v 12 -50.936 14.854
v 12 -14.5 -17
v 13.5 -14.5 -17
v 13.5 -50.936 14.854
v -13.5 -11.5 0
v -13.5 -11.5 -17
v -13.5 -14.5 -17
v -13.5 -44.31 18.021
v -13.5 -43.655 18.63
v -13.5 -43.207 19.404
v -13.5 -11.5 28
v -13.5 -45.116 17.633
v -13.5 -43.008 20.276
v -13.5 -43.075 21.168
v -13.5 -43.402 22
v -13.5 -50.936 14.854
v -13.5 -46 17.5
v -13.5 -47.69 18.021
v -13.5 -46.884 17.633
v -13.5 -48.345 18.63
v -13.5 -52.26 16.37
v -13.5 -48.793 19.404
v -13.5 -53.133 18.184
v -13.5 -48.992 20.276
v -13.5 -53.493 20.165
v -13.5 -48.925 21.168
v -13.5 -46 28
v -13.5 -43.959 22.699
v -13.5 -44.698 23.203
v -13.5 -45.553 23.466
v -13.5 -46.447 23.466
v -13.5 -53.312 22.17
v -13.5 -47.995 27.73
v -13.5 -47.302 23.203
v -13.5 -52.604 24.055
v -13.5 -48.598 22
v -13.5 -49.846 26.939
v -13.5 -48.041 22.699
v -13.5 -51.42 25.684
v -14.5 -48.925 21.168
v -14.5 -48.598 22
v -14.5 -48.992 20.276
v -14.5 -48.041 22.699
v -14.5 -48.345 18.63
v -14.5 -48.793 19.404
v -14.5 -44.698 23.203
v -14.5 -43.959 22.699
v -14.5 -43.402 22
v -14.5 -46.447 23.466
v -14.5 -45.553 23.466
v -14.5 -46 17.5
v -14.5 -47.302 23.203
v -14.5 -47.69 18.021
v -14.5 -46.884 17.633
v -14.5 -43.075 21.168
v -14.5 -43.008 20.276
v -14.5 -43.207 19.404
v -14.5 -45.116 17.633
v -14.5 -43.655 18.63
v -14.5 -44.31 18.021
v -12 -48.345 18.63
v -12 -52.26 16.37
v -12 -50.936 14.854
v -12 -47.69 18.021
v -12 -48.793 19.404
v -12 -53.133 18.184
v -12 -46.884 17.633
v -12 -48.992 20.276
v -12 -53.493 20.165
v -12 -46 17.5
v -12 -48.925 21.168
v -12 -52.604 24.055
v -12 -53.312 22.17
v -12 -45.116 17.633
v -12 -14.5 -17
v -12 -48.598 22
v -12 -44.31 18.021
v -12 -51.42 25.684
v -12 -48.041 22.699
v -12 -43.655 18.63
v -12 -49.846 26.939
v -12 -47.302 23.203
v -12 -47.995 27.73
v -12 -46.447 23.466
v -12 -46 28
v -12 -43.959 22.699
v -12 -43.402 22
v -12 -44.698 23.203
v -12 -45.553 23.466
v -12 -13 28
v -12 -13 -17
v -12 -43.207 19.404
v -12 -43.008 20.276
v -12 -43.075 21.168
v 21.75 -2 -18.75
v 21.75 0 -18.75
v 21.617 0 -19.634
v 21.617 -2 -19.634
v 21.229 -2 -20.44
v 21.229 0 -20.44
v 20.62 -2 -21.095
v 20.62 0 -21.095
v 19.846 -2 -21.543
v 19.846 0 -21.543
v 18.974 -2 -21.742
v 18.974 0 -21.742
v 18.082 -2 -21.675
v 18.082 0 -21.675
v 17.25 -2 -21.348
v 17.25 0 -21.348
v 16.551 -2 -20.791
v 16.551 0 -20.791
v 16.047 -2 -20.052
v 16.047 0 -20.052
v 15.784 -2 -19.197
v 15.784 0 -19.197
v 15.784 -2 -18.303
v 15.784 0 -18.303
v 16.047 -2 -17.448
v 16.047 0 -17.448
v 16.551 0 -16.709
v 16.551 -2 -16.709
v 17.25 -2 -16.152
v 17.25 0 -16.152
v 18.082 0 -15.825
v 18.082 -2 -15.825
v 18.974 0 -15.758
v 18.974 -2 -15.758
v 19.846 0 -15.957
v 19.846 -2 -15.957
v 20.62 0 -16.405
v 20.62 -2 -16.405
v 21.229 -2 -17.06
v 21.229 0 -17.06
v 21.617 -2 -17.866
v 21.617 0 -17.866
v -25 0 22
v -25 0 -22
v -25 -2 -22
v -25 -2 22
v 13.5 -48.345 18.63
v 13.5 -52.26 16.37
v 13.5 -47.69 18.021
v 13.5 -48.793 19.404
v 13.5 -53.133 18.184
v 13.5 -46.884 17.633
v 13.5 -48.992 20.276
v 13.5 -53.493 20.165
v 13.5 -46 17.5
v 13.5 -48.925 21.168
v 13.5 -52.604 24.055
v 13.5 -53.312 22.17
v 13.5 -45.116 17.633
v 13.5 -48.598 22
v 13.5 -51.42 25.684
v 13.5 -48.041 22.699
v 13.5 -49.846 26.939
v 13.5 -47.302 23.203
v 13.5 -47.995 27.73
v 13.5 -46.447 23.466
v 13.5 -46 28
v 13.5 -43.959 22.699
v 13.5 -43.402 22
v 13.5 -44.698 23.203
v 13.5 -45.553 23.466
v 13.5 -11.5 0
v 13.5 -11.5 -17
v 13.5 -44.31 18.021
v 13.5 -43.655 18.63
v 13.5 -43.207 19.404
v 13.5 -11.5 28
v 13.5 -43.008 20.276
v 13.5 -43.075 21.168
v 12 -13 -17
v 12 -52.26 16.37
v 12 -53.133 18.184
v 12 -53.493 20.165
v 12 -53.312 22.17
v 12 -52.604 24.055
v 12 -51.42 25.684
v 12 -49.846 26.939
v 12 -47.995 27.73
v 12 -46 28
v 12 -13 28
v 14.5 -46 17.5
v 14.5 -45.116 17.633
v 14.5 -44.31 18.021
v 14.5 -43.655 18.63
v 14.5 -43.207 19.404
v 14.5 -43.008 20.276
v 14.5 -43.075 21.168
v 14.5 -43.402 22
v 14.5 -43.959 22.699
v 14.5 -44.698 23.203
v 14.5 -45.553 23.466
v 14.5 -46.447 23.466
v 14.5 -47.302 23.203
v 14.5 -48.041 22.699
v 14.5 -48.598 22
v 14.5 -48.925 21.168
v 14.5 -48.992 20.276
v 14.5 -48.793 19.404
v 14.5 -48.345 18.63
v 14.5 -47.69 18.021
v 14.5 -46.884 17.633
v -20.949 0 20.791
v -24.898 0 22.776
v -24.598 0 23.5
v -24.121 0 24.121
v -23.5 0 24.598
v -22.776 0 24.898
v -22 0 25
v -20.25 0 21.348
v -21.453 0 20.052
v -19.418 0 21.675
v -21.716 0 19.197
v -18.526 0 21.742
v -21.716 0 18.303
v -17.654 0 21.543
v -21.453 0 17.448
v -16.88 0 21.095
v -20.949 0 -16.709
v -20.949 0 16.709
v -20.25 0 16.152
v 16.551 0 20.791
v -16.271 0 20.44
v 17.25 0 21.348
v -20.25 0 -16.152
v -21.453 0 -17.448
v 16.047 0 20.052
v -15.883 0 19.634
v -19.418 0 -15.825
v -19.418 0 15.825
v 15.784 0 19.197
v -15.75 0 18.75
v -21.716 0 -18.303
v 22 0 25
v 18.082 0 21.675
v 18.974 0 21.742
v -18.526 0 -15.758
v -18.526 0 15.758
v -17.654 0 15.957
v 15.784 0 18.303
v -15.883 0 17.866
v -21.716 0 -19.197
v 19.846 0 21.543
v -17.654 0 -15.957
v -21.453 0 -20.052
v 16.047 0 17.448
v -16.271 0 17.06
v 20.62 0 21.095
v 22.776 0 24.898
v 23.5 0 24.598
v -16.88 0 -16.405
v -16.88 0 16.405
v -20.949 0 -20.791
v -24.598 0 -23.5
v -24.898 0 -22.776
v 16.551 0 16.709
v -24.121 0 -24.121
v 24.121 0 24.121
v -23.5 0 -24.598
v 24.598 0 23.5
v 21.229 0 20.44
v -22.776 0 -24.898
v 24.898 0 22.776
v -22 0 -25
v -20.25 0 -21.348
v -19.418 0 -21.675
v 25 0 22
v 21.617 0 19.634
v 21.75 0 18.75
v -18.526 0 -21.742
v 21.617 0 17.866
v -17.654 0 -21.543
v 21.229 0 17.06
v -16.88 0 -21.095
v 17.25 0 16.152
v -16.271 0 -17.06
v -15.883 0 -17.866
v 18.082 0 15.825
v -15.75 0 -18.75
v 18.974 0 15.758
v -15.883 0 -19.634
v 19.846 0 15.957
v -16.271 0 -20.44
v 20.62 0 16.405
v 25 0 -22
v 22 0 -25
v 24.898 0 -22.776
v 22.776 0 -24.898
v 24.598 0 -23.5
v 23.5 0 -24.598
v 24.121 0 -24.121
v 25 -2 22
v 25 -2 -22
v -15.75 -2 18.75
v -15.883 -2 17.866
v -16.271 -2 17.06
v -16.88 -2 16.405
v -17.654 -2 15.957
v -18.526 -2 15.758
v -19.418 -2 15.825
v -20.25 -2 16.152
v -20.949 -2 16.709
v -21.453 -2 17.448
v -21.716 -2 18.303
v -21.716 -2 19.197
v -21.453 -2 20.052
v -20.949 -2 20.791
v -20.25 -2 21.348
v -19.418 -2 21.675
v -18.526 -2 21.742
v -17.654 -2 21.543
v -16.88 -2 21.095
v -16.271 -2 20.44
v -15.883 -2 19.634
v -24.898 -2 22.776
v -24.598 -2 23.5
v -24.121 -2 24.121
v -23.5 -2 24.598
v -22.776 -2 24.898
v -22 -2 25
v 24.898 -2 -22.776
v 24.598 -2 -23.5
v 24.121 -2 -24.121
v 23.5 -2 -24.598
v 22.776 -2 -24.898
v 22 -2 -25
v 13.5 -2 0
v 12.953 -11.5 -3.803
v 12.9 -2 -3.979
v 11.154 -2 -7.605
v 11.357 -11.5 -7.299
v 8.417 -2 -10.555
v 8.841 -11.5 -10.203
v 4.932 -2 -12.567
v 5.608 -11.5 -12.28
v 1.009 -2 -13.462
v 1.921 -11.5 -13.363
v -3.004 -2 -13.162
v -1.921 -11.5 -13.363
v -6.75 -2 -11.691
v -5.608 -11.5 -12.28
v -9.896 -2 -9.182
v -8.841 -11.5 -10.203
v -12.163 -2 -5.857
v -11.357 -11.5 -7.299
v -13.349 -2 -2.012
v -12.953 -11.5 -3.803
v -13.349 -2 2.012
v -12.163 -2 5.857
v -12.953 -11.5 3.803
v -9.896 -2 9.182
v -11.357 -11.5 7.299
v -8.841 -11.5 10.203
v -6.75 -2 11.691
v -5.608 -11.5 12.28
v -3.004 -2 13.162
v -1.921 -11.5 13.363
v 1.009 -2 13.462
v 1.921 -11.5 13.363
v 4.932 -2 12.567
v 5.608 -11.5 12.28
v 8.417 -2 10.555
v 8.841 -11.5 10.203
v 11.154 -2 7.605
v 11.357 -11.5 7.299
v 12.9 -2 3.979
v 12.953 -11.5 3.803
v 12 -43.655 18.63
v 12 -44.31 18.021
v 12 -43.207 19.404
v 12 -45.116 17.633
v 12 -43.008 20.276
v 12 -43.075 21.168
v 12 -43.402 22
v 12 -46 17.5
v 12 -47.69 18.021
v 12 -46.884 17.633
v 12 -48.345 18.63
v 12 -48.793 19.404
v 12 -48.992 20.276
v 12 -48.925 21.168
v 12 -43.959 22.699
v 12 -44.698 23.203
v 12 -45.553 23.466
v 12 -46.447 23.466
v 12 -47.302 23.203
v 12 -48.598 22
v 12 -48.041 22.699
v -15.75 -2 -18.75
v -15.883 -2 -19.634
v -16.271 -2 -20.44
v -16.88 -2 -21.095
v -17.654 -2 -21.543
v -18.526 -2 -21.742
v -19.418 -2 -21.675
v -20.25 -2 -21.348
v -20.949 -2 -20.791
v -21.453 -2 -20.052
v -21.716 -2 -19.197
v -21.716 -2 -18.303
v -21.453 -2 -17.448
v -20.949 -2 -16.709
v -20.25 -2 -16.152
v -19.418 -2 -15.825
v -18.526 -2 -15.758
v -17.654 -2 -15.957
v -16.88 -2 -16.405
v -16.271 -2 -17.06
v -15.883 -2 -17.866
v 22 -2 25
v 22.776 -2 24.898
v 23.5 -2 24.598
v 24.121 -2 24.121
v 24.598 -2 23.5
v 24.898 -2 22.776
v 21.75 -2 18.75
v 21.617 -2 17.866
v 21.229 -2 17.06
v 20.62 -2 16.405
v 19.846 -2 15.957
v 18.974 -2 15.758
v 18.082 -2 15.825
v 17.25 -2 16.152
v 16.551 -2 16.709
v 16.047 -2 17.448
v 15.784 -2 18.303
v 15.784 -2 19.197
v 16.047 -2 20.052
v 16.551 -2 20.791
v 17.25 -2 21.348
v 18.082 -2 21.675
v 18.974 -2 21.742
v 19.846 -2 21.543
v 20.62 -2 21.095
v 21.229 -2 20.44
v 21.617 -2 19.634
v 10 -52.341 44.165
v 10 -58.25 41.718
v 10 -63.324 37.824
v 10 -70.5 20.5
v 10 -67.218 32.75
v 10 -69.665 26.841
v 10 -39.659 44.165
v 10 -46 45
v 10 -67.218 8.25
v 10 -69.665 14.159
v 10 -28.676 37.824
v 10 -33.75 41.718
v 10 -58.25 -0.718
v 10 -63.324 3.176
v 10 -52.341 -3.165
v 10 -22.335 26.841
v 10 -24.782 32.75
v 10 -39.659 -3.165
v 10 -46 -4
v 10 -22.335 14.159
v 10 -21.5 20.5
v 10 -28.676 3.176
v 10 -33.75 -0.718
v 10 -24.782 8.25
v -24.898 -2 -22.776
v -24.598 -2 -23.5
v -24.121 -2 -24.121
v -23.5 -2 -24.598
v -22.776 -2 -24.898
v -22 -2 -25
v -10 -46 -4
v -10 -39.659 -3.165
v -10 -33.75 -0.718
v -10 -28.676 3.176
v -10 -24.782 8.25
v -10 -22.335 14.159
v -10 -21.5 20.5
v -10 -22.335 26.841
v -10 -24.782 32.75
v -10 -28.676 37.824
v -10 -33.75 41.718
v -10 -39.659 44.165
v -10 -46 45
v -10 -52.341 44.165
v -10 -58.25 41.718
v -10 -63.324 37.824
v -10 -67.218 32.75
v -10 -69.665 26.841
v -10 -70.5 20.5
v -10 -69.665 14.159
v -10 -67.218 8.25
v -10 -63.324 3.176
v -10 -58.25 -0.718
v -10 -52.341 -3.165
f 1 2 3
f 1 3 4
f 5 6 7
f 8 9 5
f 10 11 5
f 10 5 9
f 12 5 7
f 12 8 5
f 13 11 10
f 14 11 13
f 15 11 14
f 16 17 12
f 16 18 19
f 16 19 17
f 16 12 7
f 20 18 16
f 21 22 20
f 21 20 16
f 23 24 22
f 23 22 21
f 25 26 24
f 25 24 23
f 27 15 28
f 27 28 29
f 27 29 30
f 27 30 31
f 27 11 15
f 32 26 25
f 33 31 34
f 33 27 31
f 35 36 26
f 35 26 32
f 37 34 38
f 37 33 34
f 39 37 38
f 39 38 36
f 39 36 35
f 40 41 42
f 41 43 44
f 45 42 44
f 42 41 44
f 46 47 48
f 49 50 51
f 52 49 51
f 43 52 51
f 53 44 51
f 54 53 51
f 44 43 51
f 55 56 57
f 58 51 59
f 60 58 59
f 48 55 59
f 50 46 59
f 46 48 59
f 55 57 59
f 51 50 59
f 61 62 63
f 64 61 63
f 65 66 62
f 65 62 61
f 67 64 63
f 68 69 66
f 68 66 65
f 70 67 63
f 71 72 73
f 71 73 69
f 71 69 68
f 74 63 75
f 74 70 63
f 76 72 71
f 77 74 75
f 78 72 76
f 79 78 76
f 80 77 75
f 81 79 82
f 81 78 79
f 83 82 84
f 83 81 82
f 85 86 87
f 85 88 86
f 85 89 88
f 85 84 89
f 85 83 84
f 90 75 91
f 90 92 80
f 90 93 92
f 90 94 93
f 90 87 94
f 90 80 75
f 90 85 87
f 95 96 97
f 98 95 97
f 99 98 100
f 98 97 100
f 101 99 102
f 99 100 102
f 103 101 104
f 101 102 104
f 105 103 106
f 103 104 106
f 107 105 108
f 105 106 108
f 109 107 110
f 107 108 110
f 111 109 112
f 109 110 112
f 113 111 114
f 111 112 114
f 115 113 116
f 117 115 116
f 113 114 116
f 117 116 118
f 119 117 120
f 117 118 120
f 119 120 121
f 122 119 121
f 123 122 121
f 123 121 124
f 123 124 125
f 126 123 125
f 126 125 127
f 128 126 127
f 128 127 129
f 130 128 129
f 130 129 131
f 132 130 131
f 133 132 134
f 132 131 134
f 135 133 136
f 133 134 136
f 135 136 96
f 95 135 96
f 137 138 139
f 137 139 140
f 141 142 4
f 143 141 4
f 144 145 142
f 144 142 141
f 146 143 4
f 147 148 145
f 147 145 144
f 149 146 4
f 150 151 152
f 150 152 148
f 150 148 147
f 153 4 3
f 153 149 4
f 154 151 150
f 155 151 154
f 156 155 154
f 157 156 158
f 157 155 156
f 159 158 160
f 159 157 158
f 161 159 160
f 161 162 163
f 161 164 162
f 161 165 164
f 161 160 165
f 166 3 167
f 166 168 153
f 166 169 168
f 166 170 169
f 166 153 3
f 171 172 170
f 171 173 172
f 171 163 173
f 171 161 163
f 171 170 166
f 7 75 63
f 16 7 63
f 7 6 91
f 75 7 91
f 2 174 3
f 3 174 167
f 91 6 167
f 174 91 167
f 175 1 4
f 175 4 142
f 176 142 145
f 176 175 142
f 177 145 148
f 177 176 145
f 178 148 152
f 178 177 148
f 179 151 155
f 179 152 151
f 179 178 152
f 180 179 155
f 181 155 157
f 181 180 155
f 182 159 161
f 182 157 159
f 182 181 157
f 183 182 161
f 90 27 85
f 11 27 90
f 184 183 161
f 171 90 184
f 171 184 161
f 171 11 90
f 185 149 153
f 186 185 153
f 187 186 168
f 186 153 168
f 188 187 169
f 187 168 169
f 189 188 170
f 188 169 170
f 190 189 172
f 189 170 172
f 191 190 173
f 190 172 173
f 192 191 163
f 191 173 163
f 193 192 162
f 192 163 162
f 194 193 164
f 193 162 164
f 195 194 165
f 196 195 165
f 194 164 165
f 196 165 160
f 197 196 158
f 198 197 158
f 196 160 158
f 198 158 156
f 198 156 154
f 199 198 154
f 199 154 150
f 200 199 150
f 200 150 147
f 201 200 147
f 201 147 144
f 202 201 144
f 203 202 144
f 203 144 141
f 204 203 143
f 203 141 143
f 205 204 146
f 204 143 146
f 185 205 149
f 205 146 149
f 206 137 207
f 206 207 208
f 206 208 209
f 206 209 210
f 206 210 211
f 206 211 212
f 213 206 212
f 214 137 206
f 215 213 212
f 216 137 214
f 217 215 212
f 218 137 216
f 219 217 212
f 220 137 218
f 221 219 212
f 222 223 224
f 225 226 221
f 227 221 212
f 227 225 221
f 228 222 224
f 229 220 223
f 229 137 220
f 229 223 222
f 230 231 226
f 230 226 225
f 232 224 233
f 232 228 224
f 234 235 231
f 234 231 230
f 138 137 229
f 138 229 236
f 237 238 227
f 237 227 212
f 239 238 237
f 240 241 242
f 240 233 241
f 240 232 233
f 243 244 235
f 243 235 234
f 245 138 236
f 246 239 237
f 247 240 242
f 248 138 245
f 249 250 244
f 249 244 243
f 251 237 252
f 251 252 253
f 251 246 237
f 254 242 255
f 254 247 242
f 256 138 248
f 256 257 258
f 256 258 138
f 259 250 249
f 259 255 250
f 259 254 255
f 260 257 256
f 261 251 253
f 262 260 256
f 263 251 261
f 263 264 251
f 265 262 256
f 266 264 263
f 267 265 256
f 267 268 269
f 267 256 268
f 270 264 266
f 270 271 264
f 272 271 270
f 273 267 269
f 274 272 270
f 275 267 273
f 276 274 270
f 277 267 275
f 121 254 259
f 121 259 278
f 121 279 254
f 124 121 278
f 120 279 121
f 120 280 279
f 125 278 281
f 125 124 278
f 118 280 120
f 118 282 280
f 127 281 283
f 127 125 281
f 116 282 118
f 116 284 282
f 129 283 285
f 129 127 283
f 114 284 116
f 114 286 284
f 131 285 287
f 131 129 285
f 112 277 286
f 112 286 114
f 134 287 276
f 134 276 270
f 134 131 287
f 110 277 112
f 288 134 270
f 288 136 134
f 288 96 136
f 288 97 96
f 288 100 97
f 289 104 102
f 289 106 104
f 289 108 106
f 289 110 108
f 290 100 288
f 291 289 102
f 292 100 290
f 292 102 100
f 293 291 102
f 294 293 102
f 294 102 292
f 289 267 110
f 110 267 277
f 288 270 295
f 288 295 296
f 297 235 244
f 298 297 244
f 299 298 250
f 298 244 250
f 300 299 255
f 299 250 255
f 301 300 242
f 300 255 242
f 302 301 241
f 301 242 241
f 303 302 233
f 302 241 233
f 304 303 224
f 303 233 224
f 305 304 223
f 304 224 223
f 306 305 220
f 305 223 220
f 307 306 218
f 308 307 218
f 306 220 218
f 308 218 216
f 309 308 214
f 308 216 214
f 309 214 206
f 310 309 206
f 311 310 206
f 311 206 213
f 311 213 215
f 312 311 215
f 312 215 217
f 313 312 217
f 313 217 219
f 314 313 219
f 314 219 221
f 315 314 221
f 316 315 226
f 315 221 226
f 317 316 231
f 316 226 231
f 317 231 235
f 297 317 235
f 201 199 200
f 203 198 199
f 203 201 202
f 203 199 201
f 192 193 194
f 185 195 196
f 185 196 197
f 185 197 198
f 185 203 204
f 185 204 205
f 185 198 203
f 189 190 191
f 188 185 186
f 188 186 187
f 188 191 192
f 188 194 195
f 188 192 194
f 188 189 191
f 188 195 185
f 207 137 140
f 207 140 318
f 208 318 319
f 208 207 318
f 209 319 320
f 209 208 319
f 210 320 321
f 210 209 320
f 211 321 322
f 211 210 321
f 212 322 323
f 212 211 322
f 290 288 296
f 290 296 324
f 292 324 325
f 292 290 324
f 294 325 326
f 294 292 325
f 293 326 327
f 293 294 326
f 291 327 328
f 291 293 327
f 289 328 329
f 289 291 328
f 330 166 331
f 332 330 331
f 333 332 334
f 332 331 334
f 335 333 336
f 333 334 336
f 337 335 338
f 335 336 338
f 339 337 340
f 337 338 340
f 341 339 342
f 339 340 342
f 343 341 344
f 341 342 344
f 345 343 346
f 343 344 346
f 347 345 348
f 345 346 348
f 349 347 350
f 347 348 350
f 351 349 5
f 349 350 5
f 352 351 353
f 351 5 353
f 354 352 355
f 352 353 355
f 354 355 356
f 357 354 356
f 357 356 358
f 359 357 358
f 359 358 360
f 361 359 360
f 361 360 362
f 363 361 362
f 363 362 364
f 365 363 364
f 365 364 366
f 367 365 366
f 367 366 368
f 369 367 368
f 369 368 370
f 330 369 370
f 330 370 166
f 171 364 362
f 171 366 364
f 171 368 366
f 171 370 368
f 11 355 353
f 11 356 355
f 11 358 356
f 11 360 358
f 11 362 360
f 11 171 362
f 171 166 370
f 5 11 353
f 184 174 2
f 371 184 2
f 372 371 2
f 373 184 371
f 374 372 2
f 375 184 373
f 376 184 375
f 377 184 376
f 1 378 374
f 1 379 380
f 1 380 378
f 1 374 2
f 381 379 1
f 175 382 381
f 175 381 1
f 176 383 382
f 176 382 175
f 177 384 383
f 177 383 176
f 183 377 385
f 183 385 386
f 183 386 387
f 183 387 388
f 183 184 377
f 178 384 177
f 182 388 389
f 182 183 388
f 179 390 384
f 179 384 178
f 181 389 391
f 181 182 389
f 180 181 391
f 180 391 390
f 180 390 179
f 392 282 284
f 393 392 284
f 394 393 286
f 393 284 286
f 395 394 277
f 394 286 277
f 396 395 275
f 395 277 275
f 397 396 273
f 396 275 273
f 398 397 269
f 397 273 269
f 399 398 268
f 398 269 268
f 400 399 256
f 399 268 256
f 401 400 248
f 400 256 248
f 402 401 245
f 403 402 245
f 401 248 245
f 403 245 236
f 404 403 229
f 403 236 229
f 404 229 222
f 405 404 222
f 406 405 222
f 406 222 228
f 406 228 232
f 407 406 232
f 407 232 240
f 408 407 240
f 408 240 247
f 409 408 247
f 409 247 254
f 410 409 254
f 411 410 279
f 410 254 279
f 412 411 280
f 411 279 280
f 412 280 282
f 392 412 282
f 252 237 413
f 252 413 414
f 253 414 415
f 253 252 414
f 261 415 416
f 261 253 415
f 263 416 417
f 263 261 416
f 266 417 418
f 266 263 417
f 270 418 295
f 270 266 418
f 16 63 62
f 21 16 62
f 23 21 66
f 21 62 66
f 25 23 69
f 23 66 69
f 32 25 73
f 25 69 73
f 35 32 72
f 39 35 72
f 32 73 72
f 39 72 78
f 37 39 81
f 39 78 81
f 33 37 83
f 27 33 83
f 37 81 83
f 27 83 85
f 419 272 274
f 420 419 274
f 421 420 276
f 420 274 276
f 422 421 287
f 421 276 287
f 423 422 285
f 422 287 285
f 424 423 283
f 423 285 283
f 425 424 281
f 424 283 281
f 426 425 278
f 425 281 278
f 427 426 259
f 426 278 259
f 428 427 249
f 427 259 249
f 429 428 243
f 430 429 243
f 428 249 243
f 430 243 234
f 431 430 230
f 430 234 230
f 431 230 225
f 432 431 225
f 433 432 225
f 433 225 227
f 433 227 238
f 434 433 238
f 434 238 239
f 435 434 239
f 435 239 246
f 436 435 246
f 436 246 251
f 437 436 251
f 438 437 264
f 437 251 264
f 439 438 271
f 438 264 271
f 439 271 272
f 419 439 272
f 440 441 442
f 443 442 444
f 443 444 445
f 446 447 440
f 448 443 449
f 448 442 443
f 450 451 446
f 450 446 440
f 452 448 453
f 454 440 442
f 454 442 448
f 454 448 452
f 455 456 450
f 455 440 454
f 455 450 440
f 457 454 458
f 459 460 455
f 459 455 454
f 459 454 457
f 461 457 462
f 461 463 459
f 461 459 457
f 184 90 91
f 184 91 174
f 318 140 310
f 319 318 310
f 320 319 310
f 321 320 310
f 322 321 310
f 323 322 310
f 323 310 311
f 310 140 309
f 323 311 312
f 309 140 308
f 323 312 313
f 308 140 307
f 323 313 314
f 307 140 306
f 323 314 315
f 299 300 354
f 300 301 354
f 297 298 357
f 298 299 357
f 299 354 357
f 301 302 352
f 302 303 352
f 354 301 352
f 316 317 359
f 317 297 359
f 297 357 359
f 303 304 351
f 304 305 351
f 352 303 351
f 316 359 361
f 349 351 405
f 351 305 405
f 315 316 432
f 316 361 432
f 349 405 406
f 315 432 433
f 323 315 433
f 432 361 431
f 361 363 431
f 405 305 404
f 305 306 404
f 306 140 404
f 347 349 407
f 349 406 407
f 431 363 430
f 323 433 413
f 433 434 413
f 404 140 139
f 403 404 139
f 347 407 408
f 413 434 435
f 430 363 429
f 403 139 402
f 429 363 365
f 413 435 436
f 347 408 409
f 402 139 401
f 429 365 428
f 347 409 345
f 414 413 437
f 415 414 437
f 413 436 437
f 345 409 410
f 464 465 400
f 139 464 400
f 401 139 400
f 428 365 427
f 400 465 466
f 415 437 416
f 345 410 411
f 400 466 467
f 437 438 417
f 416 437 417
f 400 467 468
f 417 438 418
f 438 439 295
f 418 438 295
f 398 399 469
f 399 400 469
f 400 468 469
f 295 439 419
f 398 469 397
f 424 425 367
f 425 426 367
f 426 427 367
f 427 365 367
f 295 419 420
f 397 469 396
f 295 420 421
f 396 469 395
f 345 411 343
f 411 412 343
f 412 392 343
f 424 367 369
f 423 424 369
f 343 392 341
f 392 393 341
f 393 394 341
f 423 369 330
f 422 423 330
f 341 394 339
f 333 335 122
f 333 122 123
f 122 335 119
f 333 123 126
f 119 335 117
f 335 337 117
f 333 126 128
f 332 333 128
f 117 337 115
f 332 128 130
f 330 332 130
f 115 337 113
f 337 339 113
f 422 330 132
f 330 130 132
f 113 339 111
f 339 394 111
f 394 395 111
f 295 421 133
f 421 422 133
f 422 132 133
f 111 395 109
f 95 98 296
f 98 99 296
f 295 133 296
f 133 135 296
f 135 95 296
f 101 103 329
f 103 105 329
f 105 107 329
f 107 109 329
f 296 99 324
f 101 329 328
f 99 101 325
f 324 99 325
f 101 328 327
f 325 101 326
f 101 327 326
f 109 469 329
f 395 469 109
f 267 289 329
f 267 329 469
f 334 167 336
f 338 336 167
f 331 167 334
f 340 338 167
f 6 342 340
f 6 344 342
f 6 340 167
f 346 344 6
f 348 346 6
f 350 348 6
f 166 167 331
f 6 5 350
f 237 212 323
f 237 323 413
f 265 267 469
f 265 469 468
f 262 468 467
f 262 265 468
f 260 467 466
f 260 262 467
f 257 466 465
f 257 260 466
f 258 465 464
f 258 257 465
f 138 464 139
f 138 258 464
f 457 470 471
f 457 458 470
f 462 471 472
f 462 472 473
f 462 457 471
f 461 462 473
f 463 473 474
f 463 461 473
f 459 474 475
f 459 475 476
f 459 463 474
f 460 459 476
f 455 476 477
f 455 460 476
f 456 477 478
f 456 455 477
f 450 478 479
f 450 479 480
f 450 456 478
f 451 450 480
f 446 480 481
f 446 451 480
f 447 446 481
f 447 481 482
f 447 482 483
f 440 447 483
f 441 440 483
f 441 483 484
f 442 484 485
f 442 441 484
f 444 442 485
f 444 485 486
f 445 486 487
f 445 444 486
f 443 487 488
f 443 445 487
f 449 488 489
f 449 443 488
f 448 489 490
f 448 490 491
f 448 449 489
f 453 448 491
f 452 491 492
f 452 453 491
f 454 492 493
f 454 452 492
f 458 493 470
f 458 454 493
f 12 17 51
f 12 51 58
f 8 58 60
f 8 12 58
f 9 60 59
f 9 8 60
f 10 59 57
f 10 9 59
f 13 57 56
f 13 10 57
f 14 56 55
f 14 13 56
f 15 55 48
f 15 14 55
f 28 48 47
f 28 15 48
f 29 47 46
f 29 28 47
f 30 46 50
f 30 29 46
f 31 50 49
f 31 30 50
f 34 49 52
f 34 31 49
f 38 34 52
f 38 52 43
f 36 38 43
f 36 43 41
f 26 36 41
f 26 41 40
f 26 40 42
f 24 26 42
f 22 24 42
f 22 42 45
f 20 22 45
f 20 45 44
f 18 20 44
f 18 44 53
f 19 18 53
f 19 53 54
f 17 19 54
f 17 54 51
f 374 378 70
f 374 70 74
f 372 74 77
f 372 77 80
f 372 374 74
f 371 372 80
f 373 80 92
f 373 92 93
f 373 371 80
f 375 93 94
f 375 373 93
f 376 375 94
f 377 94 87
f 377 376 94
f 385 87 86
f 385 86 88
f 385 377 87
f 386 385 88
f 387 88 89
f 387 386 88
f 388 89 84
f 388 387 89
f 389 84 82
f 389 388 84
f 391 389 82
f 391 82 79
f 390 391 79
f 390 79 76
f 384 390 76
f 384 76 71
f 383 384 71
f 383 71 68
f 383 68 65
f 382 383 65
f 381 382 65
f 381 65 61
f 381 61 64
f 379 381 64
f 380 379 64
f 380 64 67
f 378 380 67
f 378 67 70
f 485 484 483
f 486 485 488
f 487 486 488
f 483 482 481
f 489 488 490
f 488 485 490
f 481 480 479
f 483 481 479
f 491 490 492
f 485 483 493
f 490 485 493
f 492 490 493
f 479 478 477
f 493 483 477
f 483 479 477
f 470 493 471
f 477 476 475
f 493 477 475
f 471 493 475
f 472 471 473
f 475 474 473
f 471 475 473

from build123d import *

# Parameters (mm, degrees)
SKETCH1_R                = 3
BOSS_EXTRUDE1_DEPTH      = 2
BOSS_EXTRUDE2_DEPTH      = 28
BOSS_EXTRUDE2_DEPTH_BACK = 17
SKETCH3_OUTSIDE_W        = 73.078
SKETCH3_OUTSIDE_H        = 73.578
CUT_EXTRUDE1_DEPTH       = 26
CUT_EXTRUDE1_DEPTH_BACK  = 26
SKETCH4_R                = 3
BOSS_EXTRUDE3_DEPTH      = 1
BOSS_EXTRUDE3_DEPTH_BACK = 28
SKETCH5_R                = 24.5
BOSS_EXTRUDE4_DEPTH      = 10
SKETCH6_R                = 13.5
BOSS_EXTRUDE5_DEPTH      = 9.5


with BuildPart() as part:
    # Sketch1 → Boss-Extrude1 (new body)
    with BuildSketch(Plane(origin=(0, 0, 0), x_dir=(1, 0, 0), z_dir=(0, 1, 0))):
        with BuildLine():
            Line((-22, -25), (22, -25))
            ThreePointArc((22, -25), (24.121320344, -24.121320344), (25, -22))
            Line((25, -22), (25, 22))
            ThreePointArc((25, 22), (24.121320344, 24.121320344), (22, 25))
            Line((22, 25), (-22, 25))
            ThreePointArc((-22, 25), (-24.121320344, 24.121320344), (-25, 22))
            Line((-25, 22), (-25, -22))
            ThreePointArc((-25, -22), (-24.121320344, -24.121320344), (-22, -25))
        make_face()
        with Locations((18.75, 18.75)):
            Circle(SKETCH1_R, mode=Mode.SUBTRACT)
        with Locations((18.75, -18.75)):
            Circle(SKETCH1_R, mode=Mode.SUBTRACT)
        with Locations((-18.75, -18.75)):
            Circle(SKETCH1_R, mode=Mode.SUBTRACT)
        with Locations((-18.75, 18.75)):
            Circle(SKETCH1_R, mode=Mode.SUBTRACT)
    extrude(amount=-BOSS_EXTRUDE1_DEPTH)



with BuildPart() as body_2:
    # Sketch2 → Boss-Extrude2 (new body, two sides)
    with BuildSketch(Plane.XY) as boss_extrude2_sk:
        Polygon((13.5, -53.5), (13.5, -11.5), (-13.5, -11.5), (-13.5, -53.5), (-12, -53.5), (-12, -13), (12, -13), (12, -53.5), align=None)
    extrude(amount=BOSS_EXTRUDE2_DEPTH)
    extrude(boss_extrude2_sk.sketch, amount=-BOSS_EXTRUDE2_DEPTH_BACK)

    # Sketch3 outside → Cut-Extrude1 (cut, two sides)
    with BuildSketch(Plane(origin=(0, 0, 0), x_dir=(0, 0, -1), z_dir=(1, 0, 0))) as cut_extrude1_sk:
        with Locations((-1.5, -26.75)):
            Rectangle(SKETCH3_OUTSIDE_W, SKETCH3_OUTSIDE_H)
        with BuildLine():
            Line((17, -11.5), (17, -14.5))
            Line((17, -14.5), (-14.853504945, -50.936303637))
            ThreePointArc((-14.853504945, -50.936303637), (-23.136407318, -53.021350045), (-28, -46))
            Line((-28, -46), (-28, -11.5))
            Line((-28, -11.5), (17, -11.5))
        make_face(mode=Mode.SUBTRACT)
    extrude(amount=CUT_EXTRUDE1_DEPTH, mode=Mode.SUBTRACT)
    extrude(cut_extrude1_sk.sketch, amount=-CUT_EXTRUDE1_DEPTH_BACK, mode=Mode.SUBTRACT)

    # Sketch4 → Boss-Extrude3 (add, two sides)
    with BuildSketch(Plane(origin=(13.5, 0, 0), x_dir=(0, 0, -1), z_dir=(1, 0, 0))) as boss_extrude3_sk:
        with Locations((-20.5, -46)):
            Circle(SKETCH4_R)
    extrude(amount=BOSS_EXTRUDE3_DEPTH)
    extrude(boss_extrude3_sk.sketch, amount=-BOSS_EXTRUDE3_DEPTH_BACK)


with BuildPart() as body_3:
    # Sketch5 → Boss-Extrude4 (new body, symmetric)
    with BuildSketch(Plane(origin=(0, 0, 0), x_dir=(0, 0, -1), z_dir=(1, 0, 0))):
        with Locations((-20.5, -46)):
            Circle(SKETCH5_R)
    extrude(amount=BOSS_EXTRUDE4_DEPTH, both=True)


with BuildPart() as part_1:
    add(part.part)

    add(body_2.part)  # Boss-Extrude5 merges body 2
    # Sketch6 → Boss-Extrude5 (add)
    with BuildSketch(Plane(origin=(0, -11.5, 0), x_dir=(1, 0, 0), z_dir=(0, 1, 0))):
        Circle(SKETCH6_R)
    extrude(amount=BOSS_EXTRUDE5_DEPTH)


solid = Compound([body_3.part, part_1.part])
